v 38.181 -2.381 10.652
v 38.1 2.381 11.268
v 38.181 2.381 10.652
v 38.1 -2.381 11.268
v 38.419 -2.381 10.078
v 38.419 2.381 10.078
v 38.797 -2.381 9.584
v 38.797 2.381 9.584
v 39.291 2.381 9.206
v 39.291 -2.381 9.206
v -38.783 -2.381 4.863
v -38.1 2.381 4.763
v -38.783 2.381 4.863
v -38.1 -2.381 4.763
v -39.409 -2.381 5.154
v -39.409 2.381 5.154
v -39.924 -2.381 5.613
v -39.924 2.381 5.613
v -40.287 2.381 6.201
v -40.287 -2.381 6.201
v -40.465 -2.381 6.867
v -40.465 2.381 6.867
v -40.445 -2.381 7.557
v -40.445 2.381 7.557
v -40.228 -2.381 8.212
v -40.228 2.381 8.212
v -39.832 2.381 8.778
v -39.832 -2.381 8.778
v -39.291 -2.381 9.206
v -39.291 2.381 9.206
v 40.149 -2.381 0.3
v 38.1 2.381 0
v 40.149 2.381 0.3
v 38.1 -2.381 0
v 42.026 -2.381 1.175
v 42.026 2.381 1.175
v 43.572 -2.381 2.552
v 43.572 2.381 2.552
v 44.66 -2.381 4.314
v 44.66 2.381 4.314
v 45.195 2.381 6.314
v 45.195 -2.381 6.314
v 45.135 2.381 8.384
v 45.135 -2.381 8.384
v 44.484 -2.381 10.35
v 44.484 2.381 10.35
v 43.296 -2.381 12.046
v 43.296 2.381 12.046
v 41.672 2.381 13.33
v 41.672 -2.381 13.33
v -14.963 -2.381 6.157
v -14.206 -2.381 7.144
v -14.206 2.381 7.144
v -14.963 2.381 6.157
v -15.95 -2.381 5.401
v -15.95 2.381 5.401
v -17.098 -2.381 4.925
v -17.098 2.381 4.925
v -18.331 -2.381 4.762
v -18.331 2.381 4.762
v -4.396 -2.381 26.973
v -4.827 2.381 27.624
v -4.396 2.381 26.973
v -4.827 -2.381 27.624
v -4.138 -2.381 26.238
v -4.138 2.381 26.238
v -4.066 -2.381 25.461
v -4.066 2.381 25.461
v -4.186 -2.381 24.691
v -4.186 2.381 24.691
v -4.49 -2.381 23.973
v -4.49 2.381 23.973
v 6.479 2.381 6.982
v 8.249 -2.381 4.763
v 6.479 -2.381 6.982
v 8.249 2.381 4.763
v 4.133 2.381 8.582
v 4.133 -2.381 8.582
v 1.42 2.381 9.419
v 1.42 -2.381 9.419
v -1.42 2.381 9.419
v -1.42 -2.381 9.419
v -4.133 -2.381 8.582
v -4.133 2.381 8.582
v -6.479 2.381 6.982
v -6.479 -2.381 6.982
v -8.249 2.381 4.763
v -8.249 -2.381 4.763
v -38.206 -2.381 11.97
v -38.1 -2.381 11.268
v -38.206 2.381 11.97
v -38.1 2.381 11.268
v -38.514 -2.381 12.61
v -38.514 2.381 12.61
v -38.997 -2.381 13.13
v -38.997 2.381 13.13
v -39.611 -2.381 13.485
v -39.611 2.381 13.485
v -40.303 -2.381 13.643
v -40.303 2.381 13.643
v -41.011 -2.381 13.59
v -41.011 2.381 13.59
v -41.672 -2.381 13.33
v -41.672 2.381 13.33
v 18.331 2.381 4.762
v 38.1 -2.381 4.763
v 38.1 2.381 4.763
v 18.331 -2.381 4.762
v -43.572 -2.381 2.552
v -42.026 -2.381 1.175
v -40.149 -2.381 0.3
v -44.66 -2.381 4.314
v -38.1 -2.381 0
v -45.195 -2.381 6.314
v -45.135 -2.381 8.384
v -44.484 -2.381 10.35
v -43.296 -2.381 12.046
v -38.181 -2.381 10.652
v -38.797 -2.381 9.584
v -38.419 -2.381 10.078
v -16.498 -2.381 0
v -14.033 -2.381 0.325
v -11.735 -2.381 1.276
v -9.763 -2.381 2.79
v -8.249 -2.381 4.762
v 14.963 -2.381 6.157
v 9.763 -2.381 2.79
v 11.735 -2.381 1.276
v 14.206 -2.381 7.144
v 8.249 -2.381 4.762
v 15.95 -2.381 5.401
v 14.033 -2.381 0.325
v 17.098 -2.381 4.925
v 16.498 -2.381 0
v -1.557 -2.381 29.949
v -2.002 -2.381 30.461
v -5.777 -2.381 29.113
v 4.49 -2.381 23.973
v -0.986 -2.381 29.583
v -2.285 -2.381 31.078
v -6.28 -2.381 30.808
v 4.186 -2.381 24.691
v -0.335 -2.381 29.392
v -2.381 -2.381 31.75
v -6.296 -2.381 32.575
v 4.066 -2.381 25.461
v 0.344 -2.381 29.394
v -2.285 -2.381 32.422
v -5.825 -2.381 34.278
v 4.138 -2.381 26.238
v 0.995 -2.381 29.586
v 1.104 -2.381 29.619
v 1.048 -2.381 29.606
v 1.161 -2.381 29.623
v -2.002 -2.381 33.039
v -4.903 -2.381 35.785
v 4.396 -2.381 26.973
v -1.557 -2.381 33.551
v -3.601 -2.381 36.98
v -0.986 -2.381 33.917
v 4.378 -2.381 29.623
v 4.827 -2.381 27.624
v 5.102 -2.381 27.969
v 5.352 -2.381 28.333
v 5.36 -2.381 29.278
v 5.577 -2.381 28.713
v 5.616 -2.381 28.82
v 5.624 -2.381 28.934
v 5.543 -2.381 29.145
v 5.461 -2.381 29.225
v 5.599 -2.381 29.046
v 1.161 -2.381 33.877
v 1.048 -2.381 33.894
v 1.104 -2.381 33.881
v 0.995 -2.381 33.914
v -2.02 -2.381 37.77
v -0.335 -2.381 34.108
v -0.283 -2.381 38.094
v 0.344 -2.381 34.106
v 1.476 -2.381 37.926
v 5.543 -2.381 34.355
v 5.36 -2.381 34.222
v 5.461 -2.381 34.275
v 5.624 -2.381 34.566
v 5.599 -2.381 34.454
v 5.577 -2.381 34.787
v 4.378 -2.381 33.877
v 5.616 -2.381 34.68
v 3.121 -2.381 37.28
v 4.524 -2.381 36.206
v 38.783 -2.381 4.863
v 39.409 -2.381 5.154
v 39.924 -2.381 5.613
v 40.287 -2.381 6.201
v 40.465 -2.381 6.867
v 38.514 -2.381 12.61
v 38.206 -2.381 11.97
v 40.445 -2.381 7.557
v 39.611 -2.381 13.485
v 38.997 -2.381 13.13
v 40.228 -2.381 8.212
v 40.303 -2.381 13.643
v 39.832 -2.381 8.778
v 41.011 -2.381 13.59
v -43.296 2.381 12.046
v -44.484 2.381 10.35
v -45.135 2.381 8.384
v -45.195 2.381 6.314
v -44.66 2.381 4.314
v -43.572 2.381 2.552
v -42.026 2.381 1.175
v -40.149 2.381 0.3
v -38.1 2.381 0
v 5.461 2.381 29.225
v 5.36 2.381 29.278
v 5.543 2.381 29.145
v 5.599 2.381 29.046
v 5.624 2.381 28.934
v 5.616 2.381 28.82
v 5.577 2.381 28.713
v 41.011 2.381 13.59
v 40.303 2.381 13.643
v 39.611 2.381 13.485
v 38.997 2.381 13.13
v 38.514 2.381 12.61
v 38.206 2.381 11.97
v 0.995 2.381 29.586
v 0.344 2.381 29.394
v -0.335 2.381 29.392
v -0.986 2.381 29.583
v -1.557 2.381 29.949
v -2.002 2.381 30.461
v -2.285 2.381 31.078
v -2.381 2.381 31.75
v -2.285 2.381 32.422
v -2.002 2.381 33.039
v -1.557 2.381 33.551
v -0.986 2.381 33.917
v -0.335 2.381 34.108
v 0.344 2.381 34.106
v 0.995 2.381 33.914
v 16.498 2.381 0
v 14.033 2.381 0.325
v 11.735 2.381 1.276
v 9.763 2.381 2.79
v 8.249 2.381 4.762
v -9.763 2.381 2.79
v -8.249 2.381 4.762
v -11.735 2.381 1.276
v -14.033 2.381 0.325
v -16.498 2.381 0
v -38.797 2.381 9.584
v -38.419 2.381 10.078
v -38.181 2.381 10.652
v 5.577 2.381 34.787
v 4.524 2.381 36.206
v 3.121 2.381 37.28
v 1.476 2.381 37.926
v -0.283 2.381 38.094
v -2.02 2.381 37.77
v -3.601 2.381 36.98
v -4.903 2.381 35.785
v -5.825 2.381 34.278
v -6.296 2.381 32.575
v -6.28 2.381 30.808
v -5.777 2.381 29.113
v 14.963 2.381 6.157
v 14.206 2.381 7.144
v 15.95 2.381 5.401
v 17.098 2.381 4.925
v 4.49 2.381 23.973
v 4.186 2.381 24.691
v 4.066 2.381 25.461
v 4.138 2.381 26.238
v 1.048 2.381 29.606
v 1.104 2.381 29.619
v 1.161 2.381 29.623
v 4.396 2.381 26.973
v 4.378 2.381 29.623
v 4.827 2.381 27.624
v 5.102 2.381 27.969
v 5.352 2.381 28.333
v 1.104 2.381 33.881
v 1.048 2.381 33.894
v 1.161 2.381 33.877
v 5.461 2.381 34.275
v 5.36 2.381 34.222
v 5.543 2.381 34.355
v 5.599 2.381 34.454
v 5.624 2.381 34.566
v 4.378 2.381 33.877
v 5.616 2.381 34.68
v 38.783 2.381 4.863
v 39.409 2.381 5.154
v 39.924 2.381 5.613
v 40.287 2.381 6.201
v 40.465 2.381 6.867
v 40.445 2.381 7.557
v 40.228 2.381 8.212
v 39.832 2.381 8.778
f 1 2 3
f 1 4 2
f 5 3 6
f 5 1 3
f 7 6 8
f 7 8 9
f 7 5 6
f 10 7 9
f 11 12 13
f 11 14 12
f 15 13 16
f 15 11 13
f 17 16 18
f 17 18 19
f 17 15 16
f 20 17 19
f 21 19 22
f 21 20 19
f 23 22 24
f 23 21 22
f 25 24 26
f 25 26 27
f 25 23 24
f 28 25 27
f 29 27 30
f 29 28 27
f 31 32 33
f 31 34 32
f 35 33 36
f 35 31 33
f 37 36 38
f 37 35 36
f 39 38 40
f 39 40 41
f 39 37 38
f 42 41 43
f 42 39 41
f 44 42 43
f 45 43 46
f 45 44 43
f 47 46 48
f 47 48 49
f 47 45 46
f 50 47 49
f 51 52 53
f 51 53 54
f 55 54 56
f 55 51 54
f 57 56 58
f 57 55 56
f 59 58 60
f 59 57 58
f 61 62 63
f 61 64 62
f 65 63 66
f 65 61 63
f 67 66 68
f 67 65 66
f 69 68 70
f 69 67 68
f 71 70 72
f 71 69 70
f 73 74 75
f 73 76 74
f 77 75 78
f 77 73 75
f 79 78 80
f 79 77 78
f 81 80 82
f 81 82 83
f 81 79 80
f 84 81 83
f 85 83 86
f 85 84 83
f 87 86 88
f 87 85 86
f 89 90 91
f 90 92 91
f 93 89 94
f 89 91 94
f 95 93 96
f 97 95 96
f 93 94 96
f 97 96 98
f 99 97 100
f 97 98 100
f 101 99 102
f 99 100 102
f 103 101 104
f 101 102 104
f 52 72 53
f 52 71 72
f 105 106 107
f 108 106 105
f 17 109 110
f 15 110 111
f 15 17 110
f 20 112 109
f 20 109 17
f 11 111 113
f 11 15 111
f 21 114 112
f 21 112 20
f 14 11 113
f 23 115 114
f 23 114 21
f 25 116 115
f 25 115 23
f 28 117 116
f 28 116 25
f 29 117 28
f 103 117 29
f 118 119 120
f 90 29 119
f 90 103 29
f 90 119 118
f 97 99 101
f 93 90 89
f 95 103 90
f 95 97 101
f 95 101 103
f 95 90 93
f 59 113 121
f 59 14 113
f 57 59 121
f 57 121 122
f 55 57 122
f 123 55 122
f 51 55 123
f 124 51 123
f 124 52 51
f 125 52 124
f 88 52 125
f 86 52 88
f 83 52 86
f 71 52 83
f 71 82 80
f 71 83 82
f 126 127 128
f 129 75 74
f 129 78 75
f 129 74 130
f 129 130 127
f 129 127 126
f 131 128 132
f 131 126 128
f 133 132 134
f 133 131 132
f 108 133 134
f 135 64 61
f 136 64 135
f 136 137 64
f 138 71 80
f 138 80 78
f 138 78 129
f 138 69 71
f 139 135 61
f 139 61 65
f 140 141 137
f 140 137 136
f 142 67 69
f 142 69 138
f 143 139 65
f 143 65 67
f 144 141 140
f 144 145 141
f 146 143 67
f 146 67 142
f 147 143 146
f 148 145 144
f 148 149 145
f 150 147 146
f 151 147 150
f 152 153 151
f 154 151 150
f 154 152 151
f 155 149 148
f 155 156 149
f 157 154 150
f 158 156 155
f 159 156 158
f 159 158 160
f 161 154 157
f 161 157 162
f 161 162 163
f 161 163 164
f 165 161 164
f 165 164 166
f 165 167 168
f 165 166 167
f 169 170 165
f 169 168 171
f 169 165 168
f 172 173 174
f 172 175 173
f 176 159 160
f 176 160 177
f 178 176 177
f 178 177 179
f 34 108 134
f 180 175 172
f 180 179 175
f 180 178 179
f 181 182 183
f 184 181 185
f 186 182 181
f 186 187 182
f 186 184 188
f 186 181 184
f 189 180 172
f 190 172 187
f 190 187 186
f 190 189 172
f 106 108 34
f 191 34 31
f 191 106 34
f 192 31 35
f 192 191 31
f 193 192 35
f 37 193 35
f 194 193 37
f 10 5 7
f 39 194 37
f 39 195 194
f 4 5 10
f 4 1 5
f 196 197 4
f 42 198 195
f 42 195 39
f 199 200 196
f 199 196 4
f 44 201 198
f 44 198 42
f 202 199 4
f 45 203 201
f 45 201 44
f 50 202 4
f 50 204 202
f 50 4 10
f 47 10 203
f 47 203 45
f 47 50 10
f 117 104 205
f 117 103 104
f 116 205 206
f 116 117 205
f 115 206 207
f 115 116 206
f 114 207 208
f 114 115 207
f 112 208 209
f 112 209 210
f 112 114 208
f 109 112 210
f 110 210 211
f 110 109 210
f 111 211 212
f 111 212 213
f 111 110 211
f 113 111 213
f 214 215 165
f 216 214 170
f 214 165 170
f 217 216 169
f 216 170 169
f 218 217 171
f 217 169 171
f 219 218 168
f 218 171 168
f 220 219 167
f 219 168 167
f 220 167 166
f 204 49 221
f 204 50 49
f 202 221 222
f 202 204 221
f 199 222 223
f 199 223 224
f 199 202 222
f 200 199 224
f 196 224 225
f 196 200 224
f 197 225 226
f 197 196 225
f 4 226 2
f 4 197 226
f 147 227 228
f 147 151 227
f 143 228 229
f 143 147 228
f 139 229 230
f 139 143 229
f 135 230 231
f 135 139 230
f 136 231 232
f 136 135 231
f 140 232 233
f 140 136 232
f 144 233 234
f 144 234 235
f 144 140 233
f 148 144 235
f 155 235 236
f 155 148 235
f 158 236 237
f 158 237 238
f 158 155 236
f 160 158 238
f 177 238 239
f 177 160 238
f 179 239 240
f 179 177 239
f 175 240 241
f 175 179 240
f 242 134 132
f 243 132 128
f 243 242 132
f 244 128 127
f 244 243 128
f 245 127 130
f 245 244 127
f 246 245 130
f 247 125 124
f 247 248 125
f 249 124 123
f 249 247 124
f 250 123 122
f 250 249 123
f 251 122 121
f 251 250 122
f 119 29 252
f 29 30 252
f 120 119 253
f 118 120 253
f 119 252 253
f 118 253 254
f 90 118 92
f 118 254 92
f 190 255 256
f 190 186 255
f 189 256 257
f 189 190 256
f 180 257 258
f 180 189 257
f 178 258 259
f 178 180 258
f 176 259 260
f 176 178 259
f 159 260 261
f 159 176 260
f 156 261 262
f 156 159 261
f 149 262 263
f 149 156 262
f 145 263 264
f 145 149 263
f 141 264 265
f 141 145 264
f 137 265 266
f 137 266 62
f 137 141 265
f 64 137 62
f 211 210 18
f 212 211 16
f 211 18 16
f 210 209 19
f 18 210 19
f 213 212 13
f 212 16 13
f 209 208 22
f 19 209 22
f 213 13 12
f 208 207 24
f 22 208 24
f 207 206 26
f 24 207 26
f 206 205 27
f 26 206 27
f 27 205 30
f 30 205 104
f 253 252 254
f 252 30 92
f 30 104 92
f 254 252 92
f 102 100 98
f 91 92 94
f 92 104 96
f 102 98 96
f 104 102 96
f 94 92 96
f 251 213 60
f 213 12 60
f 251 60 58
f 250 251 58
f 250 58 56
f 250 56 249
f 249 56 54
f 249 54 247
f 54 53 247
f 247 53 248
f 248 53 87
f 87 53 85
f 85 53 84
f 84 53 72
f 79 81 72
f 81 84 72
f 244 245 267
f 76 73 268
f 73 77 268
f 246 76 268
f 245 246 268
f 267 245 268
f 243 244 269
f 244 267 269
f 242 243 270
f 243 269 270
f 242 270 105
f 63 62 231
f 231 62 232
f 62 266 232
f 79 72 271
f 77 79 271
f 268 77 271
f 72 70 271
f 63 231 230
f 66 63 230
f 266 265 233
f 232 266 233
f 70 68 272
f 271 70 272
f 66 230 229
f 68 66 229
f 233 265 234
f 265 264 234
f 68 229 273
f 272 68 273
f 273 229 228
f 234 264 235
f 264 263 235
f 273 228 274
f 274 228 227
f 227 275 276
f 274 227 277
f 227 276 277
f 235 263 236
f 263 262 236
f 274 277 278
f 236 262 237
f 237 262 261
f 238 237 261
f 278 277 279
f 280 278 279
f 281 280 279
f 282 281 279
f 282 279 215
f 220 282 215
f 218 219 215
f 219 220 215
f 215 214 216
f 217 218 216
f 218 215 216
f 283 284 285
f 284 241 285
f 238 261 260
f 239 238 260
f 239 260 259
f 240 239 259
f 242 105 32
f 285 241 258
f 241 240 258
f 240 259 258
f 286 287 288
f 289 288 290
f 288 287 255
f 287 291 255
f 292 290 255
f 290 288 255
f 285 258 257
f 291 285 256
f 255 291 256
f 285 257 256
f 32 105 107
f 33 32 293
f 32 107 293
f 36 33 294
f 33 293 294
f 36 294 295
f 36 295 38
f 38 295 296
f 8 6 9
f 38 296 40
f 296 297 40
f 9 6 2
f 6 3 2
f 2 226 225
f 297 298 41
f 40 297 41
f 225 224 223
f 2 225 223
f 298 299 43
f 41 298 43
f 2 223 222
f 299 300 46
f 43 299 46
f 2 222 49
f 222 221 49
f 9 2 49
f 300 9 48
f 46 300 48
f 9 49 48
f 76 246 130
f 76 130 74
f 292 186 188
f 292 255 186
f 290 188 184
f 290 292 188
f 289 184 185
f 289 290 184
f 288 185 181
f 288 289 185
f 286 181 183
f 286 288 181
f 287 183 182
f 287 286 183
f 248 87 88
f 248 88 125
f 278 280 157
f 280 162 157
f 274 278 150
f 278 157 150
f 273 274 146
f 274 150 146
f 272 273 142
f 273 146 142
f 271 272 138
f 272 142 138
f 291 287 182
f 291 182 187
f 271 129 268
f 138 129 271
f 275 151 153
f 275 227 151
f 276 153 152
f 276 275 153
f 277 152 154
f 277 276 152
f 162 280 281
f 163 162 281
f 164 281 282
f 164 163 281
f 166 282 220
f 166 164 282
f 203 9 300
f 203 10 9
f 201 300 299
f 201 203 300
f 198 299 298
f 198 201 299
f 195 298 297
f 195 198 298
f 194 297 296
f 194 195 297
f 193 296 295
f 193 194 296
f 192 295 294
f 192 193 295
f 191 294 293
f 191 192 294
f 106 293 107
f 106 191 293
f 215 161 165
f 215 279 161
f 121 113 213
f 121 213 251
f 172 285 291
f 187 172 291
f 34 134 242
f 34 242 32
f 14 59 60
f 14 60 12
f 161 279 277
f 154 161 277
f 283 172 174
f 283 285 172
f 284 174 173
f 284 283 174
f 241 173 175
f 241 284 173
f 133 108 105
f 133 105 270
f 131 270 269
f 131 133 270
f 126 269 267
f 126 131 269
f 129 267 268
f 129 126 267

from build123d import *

# Parameters (mm, degrees)
F1_DEPTH    = 2.38125
F2_DEPTH    = 2.38125
F3_T1_DEPTH = 6.5449897521
F3_T3_DEPTH = 6.5449897521
F4_T1_DEPTH = 13.0899795043
F5_R        = 0.396875
F6_R        = 3.175
F7_R        = 2.38124
F9_DEPTH    = 4.7635
F10_R       = 9.52499


# Not quite as in the source:
# - a fillet or chamfer that OpenCascade refuses, or shapes differently, is made with other operations: its cross-section is extruded or revolved along the edge and cut away or added
# - a fillet or chamfer is up to 0.001 mm smaller than in the source, because OpenCascade refuses the exact size


with BuildPart() as f1:
    # F0 (on Front) → F1 (new body, symmetric)
    with BuildSketch(Plane.XZ):
        with BuildLine():
            ThreePointArc((-38.1, 14.2875), (-45.24375, 7.14375), (-38.1, 0))
            Line((-38.1, 0), (38.1, 0))
            ThreePointArc((38.1, 0), (45.24375, 7.14375), (38.1, 14.2875))
            Line((38.1, 14.2875), (38.1, 9.525))
            ThreePointArc((38.1, 9.525), (40.48125, 7.14375), (38.1, 4.7625))
            Line((38.1, 4.7625), (18.3308710468, 4.7625))
            ThreePointArc((18.3308710468, 4.7625), (15.9496210468, 5.4005540145), (14.2064250612, 7.14375))
            Line((14.2064250612, 7.14375), (3.175, 26.250738686))
            ThreePointArc((3.175, 26.250738686), (0, 25.4), (-3.175, 26.250738686))
            Line((-3.175, 26.250738686), (-14.2064250612, 7.14375))
            ThreePointArc((-14.2064250612, 7.14375), (-15.9496210468, 5.4005540145), (-18.3308710468, 4.7625))
            Line((-18.3308710468, 4.7625), (-38.1, 4.7625))
            ThreePointArc((-38.1, 4.7625), (-40.48125, 7.14375), (-38.1, 9.525))
            Line((-38.1, 9.525), (-38.1, 14.2875))
        make_face()
    extrude(amount=F1_DEPTH, both=True)

    # F0 (on Front) → F2 (join, symmetric)
    with BuildSketch(Plane.XZ):
        with BuildLine():
            ThreePointArc((5.9830851103, 33.87725), (-4.0635273104, 36.6295743459), (-3.175, 26.250738686))
            ThreePointArc((-3.175, 26.250738686), (0, 25.4), (3.175, 26.250738686))
            ThreePointArc((3.175, 26.250738686), (4.8795743459, 27.6864726896), (5.9830851103, 29.62275))
            Line((5.9830851103, 29.62275), (1.0701210212, 29.62275))
            ThreePointArc((1.0701210212, 29.62275), (-2.38125, 31.75), (1.0701210212, 33.87725))
            Line((1.0701210212, 33.87725), (5.9830851103, 33.87725))
        make_face()
    extrude(amount=F2_DEPTH, both=True)

    # F3: chamfer of 0.396875 x 1.5875 on 2 edges, made by hand

    # F3_s2 → F3_t1 (cut)
    with BuildSketch(Plane.XZ):
        with BuildLine():
            Line((5.8436173462, 34.3923519359), (4.3177222428, 33.8561996981))
            Line((4.3177222428, 33.8561996981), (4.3177222428, 33.8244496981))
            ThreePointArc((4.3177222428, 33.8244496981), (5.1504036766, 33.8455), (5.9830851103, 33.8455))
            Line((5.9830851103, 33.8455), (6.0130005359, 33.88788625))
            ThreePointArc((6.0130005359, 33.88788625), (5.918565904, 34.1369039994), (5.872535886, 34.405458444))
            Line((5.872535886, 34.405458444), (5.8436173462, 34.3923519359))
        make_face()
    extrude(amount=F3_T1_DEPTH, mode=Mode.SUBTRACT)

    # F3_s4 → F3_t3 (cut)
    with BuildSketch(Plane.XZ.offset(-6.5449897521)):
        with BuildLine():
            Line((5.8436173462, 34.3923519359), (4.3177222428, 33.8561996981))
            Line((4.3177222428, 33.8561996981), (4.3177222428, 33.8244496981))
            ThreePointArc((4.3177222428, 33.8244496981), (5.1504036766, 33.8455), (5.9830851103, 33.8455))
            Line((5.9830851103, 33.8455), (6.0130005359, 33.88788625))
            ThreePointArc((6.0130005359, 33.88788625), (5.918565904, 34.1369039994), (5.872535886, 34.405458444))
            Line((5.872535886, 34.405458444), (5.8436173462, 34.3923519359))
        make_face()
    extrude(amount=F3_T3_DEPTH, mode=Mode.SUBTRACT)

    # F4: chamfer of 1.5875 x 0.396875 on 1 edges, made by hand

    # F4_s2 → F4_t1 (cut)
    with BuildSketch(Plane.XZ.offset(-6.5449897521)):
        with BuildLine():
            Line((4.3177222428, 29.6438003019), (5.8436173462, 29.1076480641))
            Line((5.8436173462, 29.1076480641), (5.872535886, 29.094541556))
            ThreePointArc((5.872535886, 29.094541556), (5.918565904, 29.3630960006), (6.0130005359, 29.61211375))
            Line((6.0130005359, 29.61211375), (5.9830851103, 29.6545))
            ThreePointArc((5.9830851103, 29.6545), (5.1504036766, 29.6545), (4.3177222428, 29.6755503019))
            Line((4.3177222428, 29.6755503019), (4.3177222428, 29.6438003019))
        make_face()
    extrude(amount=F4_T1_DEPTH, mode=Mode.SUBTRACT)

    # F5
    f5_edges = [f1.edges().sort_by_distance(p)[0] for p in [
        (5.783708, 0, 34.371302),
        (5.783708, 0, 29.128698),
        (1.070121, 0, 29.62275),
        (1.070121, 0, 33.87725),
    ]]
    fillet(f5_edges, radius=F5_R)

    # F6
    f6_edges = [f1.edges().sort_by_distance(p)[0] for p in [
        (3.175, 0, 26.250739),
        (-3.175, 0, 26.250739),
    ]]
    fillet(f6_edges, radius=F6_R)

    # F7 (radius 2.38125 in the source; OpenCascade refuses exactly that, so slightly less here)
    f7_edges = [f1.edges().sort_by_distance(p)[0] for p in [
        (38.1, 0, 14.2875),
        (38.1, 0, 9.525),
        (-38.1, 0, 14.2875),
        (-38.1, 0, 9.525),
    ]]
    fillet(f7_edges, radius=F7_R)

    # F8 (on face) → F9 (cut, through all)
    with BuildSketch(Plane.XZ.offset(2.38125)):
        Polygon((10.9985226281, 0), (0, 19.05), (-10.9985226281, 0), align=None)
    extrude(amount=-F9_DEPTH, mode=Mode.SUBTRACT)

    # F10 (radius 9.525 in the source; OpenCascade refuses exactly that, so slightly less here)
    f10_edges = [f1.edges().sort_by_distance(p)[0] for p in [
        (0, 0, 19.05),
        (10.998523, 0, 0),
        (-10.998523, 0, 0),
    ]]
    fillet(f10_edges, radius=F10_R)


solid = f1.part
